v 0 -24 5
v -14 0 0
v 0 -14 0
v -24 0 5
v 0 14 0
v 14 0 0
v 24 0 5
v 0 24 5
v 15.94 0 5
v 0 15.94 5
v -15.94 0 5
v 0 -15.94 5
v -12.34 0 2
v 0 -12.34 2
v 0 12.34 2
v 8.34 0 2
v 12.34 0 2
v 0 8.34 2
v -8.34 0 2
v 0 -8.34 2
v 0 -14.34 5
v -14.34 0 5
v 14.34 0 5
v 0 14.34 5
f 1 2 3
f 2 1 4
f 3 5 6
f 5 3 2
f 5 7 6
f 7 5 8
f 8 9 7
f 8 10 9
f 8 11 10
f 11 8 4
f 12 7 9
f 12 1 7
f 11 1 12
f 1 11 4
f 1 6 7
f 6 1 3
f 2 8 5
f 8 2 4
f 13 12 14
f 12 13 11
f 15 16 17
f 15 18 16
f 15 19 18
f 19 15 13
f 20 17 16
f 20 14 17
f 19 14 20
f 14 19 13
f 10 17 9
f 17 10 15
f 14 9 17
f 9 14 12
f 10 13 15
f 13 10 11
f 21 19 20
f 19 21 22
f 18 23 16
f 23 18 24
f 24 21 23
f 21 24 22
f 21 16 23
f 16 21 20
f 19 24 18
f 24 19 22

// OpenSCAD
//A parametric HoloPyramid. Use with videos like:
//    https://www.youtube.com/watch?v=dnhMAQpeZ3s
//    and see things in the THIRD DIMENSION
//		Written by Brandon Pomeroy for intentional3D




union(){
	
translate([0,0,2]) cylinder(3, 8.34, 14.34, $fn=4);

	difference(){
		cylinder(5,14,24, $fn=4);

		translate([0,0,2])
			cylinder(5, 12.34, 18.34, $fn=4);
	}

}
